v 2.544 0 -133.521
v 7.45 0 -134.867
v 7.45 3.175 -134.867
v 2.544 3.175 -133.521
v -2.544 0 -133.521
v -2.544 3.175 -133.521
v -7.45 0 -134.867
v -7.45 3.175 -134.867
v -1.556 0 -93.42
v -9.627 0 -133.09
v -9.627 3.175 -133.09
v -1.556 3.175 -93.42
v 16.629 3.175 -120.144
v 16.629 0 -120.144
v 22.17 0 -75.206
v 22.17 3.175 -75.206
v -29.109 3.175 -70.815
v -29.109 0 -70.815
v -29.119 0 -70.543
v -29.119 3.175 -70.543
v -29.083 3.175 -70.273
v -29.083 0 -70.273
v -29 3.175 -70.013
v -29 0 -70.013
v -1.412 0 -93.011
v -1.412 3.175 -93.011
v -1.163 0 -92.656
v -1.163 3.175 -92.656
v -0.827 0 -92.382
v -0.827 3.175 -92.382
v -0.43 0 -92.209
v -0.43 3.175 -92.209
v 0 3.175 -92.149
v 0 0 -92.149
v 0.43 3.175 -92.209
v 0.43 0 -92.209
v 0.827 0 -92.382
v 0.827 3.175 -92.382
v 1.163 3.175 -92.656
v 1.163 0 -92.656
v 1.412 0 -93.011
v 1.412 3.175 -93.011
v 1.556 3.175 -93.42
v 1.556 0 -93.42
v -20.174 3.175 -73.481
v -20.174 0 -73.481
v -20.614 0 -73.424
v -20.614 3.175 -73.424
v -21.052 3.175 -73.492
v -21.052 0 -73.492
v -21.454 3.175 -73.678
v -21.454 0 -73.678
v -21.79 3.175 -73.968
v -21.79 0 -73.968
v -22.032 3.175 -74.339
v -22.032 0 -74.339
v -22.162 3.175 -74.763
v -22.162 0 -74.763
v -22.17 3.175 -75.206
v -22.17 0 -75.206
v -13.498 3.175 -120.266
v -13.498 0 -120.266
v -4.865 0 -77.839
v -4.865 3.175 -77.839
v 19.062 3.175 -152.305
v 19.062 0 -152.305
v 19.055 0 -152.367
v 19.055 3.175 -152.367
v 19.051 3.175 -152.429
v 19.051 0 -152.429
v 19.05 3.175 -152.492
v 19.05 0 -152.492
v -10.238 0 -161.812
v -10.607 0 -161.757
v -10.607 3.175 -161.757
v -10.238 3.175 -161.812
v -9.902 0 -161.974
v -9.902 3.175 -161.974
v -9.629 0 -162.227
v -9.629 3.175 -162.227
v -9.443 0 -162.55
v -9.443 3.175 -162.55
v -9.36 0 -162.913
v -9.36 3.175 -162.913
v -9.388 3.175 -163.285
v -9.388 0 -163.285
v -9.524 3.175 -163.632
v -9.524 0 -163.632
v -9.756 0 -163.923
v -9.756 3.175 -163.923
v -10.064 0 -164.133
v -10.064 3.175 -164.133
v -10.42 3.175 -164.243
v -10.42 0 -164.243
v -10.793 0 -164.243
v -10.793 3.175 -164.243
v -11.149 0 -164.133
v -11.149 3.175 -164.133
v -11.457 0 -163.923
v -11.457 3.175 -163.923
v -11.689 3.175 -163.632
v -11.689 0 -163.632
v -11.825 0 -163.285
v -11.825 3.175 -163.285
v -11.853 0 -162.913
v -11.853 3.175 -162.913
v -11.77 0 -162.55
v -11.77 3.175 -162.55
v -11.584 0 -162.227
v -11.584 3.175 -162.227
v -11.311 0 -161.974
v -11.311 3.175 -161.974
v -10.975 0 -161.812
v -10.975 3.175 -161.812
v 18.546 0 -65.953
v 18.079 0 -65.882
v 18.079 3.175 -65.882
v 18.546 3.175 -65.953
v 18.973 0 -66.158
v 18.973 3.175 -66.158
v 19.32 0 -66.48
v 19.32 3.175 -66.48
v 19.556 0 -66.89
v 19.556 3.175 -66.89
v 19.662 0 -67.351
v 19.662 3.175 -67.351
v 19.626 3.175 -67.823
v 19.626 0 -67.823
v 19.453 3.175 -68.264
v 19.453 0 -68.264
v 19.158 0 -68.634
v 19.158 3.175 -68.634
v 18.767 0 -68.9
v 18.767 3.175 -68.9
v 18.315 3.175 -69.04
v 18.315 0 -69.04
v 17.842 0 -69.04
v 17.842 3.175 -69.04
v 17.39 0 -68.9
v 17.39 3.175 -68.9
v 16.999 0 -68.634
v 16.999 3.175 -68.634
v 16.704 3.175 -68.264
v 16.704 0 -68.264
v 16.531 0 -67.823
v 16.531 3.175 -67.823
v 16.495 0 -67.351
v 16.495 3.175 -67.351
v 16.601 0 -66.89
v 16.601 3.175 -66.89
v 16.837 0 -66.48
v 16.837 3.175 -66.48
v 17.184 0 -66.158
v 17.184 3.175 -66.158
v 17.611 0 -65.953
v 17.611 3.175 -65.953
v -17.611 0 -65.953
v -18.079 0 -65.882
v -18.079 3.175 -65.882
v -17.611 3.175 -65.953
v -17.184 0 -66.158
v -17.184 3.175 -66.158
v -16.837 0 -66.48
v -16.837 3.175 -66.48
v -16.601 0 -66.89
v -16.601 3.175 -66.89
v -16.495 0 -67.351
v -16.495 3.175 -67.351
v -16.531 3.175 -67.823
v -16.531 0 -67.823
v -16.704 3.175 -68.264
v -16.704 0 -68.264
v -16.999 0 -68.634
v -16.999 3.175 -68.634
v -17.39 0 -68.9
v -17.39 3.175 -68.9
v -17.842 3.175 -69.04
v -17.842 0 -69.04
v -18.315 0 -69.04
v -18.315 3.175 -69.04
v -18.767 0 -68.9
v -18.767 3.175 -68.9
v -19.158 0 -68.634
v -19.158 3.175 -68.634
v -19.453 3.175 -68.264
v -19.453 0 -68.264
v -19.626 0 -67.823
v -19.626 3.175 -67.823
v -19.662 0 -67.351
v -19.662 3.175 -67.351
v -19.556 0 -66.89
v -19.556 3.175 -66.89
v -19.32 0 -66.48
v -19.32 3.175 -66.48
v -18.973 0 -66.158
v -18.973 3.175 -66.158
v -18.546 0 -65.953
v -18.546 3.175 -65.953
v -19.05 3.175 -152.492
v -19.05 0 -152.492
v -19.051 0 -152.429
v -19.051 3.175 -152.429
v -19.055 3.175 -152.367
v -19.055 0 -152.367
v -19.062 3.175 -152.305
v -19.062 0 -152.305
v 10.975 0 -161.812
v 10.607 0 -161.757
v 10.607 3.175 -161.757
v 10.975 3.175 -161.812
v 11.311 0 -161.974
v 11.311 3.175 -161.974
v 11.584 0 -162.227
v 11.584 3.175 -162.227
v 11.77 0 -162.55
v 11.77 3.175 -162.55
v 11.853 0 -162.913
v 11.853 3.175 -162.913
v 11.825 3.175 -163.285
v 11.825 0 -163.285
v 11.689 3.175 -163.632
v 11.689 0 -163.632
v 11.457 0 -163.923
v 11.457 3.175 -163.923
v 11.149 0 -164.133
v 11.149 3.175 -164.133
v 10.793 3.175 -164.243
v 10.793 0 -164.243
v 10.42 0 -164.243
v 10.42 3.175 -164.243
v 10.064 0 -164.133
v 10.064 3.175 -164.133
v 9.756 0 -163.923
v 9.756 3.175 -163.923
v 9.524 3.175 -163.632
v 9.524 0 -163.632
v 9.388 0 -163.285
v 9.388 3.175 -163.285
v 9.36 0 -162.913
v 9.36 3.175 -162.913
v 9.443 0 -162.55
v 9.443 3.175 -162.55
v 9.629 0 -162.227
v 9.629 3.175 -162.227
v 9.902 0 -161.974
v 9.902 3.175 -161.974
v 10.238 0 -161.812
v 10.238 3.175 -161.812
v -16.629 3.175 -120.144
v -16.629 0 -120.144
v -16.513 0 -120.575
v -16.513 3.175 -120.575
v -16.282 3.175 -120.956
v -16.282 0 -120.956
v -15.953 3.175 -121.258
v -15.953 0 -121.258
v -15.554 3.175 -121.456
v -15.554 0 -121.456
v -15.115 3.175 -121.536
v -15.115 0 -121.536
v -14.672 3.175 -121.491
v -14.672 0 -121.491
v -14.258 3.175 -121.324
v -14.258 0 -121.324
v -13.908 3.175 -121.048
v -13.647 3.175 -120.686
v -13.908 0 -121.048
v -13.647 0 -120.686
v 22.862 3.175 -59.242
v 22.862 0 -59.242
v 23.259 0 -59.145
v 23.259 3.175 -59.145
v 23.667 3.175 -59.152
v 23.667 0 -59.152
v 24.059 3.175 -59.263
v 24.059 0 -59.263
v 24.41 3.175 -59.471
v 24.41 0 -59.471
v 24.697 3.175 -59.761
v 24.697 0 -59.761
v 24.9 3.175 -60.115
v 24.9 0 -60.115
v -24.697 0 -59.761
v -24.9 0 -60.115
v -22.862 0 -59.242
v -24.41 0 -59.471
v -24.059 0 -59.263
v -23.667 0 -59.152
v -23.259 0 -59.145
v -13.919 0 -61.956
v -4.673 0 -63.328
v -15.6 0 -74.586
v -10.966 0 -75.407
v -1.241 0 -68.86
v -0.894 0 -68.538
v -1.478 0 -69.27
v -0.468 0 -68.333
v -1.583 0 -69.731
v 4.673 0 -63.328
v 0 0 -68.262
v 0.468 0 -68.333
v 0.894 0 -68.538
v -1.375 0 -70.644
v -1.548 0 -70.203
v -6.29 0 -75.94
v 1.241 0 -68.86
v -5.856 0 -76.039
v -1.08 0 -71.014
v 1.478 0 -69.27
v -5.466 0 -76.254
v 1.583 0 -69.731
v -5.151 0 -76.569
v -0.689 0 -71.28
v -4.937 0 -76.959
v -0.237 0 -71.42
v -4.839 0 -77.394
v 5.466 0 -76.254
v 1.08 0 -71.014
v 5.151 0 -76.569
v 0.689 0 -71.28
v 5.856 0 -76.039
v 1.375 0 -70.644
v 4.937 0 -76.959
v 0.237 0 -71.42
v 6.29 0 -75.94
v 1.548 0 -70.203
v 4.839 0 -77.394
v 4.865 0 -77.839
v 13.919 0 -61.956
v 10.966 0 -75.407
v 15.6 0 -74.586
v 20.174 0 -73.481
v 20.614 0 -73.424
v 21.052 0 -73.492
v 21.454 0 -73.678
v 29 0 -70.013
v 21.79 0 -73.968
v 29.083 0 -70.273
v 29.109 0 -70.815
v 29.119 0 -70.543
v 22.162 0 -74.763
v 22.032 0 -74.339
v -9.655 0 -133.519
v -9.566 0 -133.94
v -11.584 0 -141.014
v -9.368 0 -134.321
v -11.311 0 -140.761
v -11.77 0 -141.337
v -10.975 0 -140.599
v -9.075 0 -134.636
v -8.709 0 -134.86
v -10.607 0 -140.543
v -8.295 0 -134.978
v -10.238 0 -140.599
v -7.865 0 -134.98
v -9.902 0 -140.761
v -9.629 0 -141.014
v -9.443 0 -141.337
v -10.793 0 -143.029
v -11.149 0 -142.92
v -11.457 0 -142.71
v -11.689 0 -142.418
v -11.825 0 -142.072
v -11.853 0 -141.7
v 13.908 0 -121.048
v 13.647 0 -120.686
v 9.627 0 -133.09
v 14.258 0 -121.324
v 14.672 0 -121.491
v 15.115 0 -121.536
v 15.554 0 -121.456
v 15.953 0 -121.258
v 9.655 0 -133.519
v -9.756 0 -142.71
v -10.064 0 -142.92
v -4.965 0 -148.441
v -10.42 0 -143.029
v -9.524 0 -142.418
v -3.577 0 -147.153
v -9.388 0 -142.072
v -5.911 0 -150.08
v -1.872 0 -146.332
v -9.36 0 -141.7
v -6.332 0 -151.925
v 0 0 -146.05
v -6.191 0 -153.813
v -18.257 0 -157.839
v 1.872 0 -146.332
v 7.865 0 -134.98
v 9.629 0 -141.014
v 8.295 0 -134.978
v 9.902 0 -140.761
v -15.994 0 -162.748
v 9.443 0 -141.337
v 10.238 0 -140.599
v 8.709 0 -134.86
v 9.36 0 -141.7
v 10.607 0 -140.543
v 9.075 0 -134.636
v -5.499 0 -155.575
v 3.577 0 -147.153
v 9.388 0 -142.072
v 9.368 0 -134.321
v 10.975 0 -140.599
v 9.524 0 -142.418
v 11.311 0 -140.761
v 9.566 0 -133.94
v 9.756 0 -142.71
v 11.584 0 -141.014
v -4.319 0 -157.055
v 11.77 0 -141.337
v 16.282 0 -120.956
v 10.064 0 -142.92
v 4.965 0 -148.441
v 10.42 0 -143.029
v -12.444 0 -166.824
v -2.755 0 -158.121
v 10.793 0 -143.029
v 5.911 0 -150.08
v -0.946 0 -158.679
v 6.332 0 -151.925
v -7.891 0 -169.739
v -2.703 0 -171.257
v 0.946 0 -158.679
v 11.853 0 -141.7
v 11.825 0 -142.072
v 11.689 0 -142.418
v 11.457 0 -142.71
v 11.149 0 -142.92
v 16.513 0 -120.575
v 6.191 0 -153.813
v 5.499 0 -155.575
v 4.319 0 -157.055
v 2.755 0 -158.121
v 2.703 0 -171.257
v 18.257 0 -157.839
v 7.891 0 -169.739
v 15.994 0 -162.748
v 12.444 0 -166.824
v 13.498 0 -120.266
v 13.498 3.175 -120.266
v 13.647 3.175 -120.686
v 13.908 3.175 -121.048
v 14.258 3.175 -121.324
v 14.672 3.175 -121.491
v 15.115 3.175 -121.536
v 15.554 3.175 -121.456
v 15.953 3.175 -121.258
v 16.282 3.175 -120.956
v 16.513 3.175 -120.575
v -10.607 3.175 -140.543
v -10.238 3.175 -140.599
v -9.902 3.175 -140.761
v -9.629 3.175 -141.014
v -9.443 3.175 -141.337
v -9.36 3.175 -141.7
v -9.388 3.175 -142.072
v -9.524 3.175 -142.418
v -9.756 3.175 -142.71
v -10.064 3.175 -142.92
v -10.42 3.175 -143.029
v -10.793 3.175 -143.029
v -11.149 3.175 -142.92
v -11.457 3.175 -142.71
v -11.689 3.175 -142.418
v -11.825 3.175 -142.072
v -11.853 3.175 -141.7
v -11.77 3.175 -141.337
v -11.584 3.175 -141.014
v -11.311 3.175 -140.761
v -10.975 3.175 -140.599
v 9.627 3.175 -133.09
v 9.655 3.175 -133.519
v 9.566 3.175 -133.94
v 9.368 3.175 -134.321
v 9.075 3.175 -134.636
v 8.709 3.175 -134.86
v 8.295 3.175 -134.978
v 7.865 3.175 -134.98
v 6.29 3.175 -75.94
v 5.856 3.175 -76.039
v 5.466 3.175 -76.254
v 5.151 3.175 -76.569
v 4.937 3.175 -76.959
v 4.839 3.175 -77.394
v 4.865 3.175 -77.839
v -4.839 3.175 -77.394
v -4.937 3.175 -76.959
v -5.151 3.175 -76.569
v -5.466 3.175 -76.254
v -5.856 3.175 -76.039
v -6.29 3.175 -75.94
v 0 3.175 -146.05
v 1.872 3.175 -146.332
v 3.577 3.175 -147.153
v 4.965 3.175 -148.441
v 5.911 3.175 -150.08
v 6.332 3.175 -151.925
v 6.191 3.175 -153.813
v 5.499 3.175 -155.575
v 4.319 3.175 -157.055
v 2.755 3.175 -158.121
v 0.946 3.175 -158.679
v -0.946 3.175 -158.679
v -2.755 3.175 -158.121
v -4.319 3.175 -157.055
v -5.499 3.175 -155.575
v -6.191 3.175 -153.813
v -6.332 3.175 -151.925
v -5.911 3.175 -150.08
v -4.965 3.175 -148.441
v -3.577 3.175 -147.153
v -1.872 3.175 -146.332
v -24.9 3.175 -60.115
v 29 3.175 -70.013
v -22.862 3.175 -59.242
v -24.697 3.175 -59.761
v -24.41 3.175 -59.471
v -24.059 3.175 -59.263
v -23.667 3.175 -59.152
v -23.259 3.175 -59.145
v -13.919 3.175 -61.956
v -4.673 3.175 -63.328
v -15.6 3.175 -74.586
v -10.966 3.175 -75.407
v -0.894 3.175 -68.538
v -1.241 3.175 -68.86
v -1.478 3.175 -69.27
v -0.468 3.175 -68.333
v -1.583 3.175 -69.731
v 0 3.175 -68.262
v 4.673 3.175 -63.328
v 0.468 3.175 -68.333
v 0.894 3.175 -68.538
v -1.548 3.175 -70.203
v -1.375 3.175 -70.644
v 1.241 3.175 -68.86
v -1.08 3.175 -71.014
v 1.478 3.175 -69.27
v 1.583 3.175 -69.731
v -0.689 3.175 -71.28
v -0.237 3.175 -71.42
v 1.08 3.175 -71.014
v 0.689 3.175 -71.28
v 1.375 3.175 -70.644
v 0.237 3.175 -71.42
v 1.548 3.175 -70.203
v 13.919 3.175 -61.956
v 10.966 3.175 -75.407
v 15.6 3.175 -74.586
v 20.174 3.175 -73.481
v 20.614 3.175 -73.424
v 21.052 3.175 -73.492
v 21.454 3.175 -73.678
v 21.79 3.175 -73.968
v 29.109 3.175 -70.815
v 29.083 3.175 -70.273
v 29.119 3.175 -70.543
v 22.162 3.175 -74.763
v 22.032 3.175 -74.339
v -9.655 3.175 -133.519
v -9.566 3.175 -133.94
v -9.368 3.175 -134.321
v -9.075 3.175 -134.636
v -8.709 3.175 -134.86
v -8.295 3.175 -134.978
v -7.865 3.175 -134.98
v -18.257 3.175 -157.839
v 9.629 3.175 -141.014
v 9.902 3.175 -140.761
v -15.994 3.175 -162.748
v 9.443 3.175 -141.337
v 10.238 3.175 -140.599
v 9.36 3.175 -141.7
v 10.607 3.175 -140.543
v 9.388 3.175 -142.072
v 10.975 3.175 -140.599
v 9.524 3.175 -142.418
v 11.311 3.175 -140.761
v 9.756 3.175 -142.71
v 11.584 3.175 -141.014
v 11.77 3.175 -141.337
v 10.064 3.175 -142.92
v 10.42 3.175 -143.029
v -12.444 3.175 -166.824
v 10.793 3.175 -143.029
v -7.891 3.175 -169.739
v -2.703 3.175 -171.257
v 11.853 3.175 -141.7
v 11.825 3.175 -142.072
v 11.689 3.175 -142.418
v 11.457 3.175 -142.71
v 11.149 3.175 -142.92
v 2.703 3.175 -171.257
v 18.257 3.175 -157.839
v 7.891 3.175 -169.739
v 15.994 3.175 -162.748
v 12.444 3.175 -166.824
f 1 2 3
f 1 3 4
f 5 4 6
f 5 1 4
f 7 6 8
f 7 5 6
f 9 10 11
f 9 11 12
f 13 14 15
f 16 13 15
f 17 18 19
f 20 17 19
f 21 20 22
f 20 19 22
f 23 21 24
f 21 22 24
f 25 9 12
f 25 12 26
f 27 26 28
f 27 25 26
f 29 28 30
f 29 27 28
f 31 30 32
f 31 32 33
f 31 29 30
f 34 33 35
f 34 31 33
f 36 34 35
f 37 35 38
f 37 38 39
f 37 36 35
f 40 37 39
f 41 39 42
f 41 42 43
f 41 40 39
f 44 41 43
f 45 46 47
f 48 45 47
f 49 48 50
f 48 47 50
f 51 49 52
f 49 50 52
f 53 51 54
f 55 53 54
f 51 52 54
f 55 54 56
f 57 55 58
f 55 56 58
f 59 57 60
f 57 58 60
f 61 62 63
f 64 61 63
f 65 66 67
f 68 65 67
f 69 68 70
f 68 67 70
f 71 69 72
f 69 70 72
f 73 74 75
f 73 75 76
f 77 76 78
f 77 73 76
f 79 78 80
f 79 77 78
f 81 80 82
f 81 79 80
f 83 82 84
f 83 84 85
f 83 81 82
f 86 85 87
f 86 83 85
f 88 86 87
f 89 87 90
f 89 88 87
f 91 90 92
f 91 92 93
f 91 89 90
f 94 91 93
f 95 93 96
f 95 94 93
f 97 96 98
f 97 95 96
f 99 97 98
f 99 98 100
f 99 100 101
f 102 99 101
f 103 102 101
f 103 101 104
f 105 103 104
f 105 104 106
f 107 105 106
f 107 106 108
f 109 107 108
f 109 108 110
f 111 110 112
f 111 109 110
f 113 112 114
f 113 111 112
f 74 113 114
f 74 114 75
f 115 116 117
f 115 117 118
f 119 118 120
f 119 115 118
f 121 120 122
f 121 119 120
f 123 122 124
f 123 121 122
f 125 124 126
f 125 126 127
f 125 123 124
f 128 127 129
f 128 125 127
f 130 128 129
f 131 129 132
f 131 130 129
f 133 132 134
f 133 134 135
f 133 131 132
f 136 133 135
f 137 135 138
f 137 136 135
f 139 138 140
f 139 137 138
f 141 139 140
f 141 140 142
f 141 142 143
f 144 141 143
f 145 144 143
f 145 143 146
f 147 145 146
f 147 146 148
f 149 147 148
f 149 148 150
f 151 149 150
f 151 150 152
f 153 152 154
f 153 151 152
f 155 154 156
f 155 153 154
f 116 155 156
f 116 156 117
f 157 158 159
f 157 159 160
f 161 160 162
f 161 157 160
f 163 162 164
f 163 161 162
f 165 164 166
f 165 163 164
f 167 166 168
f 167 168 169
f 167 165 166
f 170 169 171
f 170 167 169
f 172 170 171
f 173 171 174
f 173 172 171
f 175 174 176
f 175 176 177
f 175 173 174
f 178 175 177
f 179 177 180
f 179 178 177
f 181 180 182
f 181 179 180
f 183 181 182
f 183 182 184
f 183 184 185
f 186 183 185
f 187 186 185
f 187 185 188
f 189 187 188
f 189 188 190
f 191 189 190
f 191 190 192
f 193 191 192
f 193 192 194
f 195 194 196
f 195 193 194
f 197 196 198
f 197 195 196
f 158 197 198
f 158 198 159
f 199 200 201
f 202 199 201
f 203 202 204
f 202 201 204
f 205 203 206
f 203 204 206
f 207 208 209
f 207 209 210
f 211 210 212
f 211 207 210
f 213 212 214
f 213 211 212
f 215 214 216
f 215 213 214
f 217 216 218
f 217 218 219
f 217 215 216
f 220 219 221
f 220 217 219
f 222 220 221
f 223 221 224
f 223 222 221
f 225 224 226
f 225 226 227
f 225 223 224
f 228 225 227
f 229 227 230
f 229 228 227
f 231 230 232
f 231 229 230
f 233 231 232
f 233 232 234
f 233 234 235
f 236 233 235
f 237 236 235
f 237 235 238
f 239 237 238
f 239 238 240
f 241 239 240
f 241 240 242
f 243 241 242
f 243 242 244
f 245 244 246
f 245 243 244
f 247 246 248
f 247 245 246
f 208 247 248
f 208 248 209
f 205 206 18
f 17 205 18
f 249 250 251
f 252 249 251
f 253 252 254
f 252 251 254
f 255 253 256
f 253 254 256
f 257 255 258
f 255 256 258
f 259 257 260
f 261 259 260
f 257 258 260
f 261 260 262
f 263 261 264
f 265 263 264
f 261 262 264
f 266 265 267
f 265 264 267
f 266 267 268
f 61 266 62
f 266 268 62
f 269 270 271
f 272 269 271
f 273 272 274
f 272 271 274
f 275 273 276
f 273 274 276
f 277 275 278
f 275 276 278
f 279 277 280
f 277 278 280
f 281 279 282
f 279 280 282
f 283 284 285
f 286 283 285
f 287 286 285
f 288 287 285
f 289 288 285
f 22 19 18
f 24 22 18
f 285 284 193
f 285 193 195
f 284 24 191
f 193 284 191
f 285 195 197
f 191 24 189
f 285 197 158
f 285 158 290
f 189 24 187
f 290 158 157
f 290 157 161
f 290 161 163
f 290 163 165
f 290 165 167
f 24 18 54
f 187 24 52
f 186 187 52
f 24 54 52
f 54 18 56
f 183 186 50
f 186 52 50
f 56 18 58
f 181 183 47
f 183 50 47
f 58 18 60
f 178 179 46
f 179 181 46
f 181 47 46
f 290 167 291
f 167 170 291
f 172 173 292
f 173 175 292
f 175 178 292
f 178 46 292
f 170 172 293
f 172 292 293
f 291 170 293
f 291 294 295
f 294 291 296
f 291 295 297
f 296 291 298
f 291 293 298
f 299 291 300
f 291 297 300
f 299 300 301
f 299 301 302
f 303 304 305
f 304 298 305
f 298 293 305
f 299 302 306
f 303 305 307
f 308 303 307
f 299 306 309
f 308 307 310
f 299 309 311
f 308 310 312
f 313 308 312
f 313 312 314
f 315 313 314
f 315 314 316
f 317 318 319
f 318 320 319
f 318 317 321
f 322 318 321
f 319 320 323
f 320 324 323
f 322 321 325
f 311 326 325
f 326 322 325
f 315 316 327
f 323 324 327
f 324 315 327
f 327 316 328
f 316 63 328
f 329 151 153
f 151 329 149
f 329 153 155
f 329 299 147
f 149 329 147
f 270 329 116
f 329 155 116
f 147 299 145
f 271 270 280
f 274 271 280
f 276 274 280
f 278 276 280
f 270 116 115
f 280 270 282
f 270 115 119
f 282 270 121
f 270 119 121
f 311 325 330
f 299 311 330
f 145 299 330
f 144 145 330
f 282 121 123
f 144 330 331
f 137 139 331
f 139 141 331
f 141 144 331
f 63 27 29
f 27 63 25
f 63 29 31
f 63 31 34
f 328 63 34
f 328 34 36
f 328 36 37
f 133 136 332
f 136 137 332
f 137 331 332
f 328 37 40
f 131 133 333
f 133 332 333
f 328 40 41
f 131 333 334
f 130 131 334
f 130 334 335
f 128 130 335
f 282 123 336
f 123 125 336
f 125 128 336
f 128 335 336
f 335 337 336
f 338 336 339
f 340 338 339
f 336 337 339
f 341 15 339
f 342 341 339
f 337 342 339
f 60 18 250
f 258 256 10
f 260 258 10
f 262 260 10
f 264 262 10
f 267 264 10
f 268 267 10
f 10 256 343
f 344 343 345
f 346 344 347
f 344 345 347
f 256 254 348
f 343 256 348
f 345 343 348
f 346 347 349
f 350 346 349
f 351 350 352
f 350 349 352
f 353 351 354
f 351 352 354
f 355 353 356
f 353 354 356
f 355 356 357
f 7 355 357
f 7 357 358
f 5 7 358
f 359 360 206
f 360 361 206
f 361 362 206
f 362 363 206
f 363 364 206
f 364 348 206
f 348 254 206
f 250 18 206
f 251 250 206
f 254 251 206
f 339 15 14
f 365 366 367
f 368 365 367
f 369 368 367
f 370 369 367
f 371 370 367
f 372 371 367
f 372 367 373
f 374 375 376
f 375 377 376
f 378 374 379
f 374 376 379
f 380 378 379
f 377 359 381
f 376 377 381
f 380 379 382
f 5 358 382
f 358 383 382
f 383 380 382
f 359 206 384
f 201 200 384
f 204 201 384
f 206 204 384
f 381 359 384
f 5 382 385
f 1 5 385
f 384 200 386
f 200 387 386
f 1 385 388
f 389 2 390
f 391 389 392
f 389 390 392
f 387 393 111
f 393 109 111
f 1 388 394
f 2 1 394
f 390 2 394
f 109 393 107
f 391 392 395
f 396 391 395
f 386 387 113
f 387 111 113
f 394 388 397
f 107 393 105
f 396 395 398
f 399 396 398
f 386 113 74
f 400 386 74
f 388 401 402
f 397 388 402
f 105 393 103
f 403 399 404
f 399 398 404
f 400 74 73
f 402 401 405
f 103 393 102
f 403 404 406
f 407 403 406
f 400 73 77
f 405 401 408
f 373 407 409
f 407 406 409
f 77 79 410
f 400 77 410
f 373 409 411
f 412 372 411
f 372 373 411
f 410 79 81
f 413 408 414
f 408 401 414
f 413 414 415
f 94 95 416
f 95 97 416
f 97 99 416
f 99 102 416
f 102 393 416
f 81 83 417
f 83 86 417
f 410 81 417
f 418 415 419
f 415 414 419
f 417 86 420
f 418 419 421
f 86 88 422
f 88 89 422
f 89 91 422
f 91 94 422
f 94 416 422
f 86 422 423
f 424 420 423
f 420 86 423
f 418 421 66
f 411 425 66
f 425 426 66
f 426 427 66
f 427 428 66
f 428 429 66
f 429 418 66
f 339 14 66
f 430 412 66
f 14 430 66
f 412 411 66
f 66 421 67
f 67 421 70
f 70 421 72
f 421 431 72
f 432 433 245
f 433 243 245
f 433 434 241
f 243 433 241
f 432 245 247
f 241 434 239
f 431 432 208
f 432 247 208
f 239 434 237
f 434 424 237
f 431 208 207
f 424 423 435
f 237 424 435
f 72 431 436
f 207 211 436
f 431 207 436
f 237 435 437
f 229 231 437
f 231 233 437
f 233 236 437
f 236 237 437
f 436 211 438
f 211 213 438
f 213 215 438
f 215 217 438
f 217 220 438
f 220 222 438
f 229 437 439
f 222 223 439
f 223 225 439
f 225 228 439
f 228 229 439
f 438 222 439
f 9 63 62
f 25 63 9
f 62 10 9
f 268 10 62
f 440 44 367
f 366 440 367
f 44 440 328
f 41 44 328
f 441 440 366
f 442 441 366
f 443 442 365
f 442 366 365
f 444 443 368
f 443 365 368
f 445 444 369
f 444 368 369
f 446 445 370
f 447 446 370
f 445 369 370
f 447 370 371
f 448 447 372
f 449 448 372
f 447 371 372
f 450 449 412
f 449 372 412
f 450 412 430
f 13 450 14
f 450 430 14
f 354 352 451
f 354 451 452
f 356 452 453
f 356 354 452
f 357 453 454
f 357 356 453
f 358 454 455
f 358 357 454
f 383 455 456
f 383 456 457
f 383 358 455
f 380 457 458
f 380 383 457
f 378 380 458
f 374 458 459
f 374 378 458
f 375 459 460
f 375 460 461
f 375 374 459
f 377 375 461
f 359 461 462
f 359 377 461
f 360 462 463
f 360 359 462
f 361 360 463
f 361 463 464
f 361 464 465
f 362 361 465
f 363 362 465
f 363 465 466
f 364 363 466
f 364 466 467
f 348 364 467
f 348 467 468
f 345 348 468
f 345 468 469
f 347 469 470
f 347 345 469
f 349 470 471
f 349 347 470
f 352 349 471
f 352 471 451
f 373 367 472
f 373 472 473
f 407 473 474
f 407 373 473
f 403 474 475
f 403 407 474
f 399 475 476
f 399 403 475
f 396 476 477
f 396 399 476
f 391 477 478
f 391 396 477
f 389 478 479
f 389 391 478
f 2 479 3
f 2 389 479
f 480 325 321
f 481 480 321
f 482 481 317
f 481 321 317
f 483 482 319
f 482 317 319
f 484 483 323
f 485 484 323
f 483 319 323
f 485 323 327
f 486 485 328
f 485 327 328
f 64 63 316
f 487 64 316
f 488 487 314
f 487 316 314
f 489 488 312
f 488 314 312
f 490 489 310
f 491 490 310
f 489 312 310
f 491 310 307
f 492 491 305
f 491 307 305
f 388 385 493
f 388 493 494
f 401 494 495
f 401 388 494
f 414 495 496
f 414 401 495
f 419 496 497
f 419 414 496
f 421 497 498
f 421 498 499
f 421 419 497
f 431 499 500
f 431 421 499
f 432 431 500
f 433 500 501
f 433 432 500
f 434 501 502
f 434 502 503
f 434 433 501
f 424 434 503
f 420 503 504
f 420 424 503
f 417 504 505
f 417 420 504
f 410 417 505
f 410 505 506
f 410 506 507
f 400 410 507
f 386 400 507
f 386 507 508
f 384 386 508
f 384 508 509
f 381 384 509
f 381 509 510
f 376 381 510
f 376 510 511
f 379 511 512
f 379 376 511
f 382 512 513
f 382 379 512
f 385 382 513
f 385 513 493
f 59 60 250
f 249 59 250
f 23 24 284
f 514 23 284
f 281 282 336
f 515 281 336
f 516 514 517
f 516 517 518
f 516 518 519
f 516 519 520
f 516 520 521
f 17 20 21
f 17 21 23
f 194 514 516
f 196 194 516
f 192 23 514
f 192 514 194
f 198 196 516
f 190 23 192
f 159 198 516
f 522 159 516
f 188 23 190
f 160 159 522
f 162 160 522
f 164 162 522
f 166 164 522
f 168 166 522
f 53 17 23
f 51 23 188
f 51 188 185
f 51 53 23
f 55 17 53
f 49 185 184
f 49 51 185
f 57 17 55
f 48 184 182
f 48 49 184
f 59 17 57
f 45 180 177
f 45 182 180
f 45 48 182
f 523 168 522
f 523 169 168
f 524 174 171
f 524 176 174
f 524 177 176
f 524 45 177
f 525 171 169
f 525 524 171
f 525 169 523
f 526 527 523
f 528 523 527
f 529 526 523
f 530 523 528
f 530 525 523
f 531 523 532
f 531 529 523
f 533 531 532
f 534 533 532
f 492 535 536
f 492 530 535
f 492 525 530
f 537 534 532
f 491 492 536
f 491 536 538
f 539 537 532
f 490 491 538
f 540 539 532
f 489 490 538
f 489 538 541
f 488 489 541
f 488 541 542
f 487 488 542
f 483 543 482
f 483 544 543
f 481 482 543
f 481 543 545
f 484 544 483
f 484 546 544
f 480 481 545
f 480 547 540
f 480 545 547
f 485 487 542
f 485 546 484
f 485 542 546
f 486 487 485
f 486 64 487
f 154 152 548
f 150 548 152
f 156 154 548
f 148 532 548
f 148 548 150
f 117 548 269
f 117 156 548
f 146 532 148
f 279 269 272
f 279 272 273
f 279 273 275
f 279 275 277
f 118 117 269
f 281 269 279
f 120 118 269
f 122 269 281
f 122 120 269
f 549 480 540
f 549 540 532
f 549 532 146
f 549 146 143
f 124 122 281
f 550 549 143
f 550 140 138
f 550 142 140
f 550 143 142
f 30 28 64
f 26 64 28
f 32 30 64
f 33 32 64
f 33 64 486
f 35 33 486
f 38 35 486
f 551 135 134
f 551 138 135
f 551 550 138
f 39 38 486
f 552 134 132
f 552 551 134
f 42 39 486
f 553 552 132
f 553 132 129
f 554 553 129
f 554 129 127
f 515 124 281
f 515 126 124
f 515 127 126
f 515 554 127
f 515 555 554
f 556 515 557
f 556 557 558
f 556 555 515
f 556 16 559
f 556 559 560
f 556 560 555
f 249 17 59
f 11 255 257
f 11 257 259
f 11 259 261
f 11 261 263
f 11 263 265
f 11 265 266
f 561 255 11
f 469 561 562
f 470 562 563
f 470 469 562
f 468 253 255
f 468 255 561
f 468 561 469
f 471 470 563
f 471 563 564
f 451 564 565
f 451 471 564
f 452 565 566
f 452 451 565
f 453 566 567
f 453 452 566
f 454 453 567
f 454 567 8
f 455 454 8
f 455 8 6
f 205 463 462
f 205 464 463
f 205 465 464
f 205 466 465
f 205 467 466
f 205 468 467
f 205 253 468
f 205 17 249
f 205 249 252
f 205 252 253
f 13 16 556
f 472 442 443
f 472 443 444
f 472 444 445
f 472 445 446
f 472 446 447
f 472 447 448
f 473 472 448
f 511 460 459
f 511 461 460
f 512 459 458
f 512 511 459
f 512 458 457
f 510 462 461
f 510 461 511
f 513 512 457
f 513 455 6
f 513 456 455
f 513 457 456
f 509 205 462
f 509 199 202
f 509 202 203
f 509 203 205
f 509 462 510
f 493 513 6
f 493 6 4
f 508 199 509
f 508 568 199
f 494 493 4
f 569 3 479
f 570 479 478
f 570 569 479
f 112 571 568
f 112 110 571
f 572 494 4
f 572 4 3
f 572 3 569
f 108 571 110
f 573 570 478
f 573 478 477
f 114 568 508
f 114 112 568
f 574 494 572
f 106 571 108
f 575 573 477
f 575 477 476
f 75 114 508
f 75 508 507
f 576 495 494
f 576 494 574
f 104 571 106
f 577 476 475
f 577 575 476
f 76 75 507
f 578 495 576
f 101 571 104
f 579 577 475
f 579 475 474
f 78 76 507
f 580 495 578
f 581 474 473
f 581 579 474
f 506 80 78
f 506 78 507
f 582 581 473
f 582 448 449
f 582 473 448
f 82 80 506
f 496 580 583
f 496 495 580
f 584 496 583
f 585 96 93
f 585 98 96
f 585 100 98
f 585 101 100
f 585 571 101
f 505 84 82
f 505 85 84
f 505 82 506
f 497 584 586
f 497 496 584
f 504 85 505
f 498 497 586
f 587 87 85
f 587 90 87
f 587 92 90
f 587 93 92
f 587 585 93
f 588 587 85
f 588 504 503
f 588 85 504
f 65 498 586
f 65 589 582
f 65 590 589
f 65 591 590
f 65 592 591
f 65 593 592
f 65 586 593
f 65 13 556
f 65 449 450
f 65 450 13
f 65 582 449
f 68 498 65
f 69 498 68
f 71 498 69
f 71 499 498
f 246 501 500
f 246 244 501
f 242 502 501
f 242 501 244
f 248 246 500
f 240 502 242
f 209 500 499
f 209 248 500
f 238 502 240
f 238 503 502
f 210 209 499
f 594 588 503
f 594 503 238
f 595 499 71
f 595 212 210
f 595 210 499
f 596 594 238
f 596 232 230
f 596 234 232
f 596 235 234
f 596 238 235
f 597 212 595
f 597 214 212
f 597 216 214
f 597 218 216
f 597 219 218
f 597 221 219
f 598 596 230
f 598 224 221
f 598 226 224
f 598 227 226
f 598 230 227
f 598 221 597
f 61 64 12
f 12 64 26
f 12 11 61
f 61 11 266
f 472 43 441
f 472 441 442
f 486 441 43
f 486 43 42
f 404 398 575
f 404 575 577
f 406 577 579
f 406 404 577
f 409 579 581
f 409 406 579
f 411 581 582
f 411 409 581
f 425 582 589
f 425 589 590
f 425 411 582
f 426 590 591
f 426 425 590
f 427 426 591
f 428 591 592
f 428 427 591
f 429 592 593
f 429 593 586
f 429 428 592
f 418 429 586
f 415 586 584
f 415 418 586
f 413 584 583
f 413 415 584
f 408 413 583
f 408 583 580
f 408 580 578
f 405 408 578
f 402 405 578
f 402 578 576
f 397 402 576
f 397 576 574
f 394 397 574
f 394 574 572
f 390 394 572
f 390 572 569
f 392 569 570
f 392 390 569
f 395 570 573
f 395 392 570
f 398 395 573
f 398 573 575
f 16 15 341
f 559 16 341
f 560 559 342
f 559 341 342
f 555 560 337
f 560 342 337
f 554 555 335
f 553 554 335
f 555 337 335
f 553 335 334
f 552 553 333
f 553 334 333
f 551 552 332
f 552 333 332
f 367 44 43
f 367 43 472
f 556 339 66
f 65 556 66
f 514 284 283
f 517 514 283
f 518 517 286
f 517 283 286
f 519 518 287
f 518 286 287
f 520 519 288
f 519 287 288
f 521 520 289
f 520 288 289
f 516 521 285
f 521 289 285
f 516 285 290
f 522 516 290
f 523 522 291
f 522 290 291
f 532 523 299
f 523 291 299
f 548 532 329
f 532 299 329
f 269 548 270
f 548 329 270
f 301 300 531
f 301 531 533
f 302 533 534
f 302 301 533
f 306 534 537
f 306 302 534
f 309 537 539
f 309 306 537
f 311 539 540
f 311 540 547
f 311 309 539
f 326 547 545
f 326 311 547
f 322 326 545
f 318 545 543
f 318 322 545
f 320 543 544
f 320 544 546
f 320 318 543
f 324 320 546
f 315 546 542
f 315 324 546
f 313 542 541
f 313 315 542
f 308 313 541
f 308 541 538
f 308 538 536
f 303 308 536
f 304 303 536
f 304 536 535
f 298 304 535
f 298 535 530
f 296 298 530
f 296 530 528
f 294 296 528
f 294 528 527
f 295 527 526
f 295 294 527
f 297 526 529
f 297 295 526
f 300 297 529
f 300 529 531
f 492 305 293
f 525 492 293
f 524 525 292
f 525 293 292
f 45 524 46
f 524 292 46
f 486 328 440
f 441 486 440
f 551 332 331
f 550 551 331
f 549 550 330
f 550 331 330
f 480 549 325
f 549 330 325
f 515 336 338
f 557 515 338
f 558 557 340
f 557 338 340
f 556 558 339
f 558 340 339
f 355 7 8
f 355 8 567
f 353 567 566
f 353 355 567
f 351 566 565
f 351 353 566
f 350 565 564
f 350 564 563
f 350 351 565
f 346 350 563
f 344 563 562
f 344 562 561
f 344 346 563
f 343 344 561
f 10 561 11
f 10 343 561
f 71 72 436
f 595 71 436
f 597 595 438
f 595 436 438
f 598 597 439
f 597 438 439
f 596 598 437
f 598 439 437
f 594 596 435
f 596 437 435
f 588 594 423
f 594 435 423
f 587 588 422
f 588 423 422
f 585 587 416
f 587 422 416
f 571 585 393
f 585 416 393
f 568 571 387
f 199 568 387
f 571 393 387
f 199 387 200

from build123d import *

# Parameters (mm, degrees)
SKETCH1_R           = 1.25
SKETCH1_R_2         = 1.5875
SKETCH1_R_3         = 6.35
SKETCH1_R_4         = 1.587499999
BOSS_EXTRUDE1_DEPTH = 3.175


with BuildPart() as part:
    # Sketch1 → Boss-Extrude1 (new body)
    with BuildSketch(Plane(origin=(0, 0, 0), x_dir=(1, 0, 0), z_dir=(0, 1, 0))):
        with BuildLine():
            Line((-19.061691445, 152.305177286), (-29.109279467, 70.814859111))
            ThreePointArc((-29.109279467, 70.814859111), (-29.106764186, 70.406916612), (-29.000369251, 70.01308476))
            Line((-29.000369251, 70.01308476), (-24.900498144, 60.115120329))
            ThreePointArc((-24.900498144, 60.115120329), (-24.059191565, 59.263489811), (-22.862282328, 59.241590515))
            ThreePointArc((-22.862282328, 59.241590515), (0, 63.5), (22.862282328, 59.241590515))
            ThreePointArc((22.862282328, 59.241590515), (24.059191565, 59.263489811), (24.900498144, 60.115120329))
            Line((24.900498144, 60.115120329), (29.000369251, 70.01308476))
            ThreePointArc((29.000369251, 70.01308476), (29.106764186, 70.406916612), (29.109279467, 70.814859111))
            Line((29.109279467, 70.814859111), (19.061691445, 152.305177286))
            ThreePointArc((19.061691445, 152.305177286), (19.052985039, 152.398309253), (19.049778848, 152.491792328))
            ThreePointArc((19.049778848, 152.491792328), (0, 171.45), (-19.049778848, 152.491792328))
            ThreePointArc((-19.049778848, 152.491792328), (-19.052985039, 152.398309253), (-19.061691445, 152.305177286))
        make_face()
        with Locations(Location((-10.606601718, 163.006601718, 0), (0, 0, 270))):
            Circle(SKETCH1_R, mode=Mode.SUBTRACT)
        with Locations(Location((0, 69.85, 0), (0, 0, 270))):
            Circle(SKETCH1_R_2, mode=Mode.SUBTRACT)
        with Locations(Location((18.0785103, 67.469918962, 0), (0, 0, 270))):
            Circle(SKETCH1_R_2, mode=Mode.SUBTRACT)
        with Locations(Location((10.606601718, 163.006601718, 0), (0, 0, 270))):
            Circle(SKETCH1_R, mode=Mode.SUBTRACT)
        with Locations(Location((10.606601718, 141.793398282, 0), (0, 0, 270))):
            Circle(SKETCH1_R, mode=Mode.SUBTRACT)
        with Locations(Location((0, 152.4, 0), (0, 0, 270))):
            Circle(SKETCH1_R_3, mode=Mode.SUBTRACT)
        with Locations(Location((-10.606601718, 141.793398282, 0), (0, 0, 270))):
            Circle(SKETCH1_R, mode=Mode.SUBTRACT)
        with Locations(Location((-18.078510302, 67.469918971, 0), (0, 0, 270))):
            Circle(SKETCH1_R_4, mode=Mode.SUBTRACT)
        with BuildLine():
            Line((-13.497810395, 120.266290898), (-4.865408959, 77.838541906))
            ThreePointArc((-4.865408959, 77.838541906), (-5.15124286, 76.569257194), (-6.289995152, 75.939949704))
            ThreePointArc((-6.289995152, 75.939949704), (-13.288948331, 75.032285399), (-20.173905346, 73.480974021))
            ThreePointArc((-20.173905346, 73.480974021), (-21.632306598, 73.810794489), (-22.169764015, 75.206092049))
            Line((-22.169764015, 75.206092049), (-16.629007128, 120.144045384))
            ThreePointArc((-16.629007128, 120.144045384), (-15.115368796, 121.53607252), (-13.497810395, 120.266290898))
        make_face(mode=Mode.SUBTRACT)
        with BuildLine():
            Line((-9.626782179, 133.089731304), (-1.555627758, 93.42047862))
            ThreePointArc((-1.555627758, 93.42047862), (0, 92.149488537), (1.555627758, 93.42047862))
            Line((1.555627758, 93.42047862), (9.626782179, 133.089731304))
            ThreePointArc((9.626782179, 133.089731304), (9.075338598, 134.635781943), (7.450296388, 134.867299588))
            ThreePointArc((7.450296388, 134.867299588), (0, 133.35), (-7.450296388, 134.867299588))
            ThreePointArc((-7.450296388, 134.867299588), (-9.075338598, 134.635781943), (-9.626782179, 133.089731304))
        make_face(mode=Mode.SUBTRACT)
        with BuildLine():
            Line((4.865408959, 77.838541906), (13.497810395, 120.266290898))
            ThreePointArc((13.497810395, 120.266290898), (15.115368796, 121.53607252), (16.629007128, 120.144045384))
            Line((16.629007128, 120.144045384), (22.169764015, 75.206092049))
            ThreePointArc((22.169764015, 75.206092049), (21.632306598, 73.810794489), (20.173905346, 73.480974021))
            ThreePointArc((20.173905346, 73.480974021), (13.288948331, 75.032285399), (6.289995152, 75.939949704))
            ThreePointArc((6.289995152, 75.939949704), (5.15124286, 76.569257194), (4.865408959, 77.838541906))
        make_face(mode=Mode.SUBTRACT)
    extrude(amount=BOSS_EXTRUDE1_DEPTH)


solid = part.part
